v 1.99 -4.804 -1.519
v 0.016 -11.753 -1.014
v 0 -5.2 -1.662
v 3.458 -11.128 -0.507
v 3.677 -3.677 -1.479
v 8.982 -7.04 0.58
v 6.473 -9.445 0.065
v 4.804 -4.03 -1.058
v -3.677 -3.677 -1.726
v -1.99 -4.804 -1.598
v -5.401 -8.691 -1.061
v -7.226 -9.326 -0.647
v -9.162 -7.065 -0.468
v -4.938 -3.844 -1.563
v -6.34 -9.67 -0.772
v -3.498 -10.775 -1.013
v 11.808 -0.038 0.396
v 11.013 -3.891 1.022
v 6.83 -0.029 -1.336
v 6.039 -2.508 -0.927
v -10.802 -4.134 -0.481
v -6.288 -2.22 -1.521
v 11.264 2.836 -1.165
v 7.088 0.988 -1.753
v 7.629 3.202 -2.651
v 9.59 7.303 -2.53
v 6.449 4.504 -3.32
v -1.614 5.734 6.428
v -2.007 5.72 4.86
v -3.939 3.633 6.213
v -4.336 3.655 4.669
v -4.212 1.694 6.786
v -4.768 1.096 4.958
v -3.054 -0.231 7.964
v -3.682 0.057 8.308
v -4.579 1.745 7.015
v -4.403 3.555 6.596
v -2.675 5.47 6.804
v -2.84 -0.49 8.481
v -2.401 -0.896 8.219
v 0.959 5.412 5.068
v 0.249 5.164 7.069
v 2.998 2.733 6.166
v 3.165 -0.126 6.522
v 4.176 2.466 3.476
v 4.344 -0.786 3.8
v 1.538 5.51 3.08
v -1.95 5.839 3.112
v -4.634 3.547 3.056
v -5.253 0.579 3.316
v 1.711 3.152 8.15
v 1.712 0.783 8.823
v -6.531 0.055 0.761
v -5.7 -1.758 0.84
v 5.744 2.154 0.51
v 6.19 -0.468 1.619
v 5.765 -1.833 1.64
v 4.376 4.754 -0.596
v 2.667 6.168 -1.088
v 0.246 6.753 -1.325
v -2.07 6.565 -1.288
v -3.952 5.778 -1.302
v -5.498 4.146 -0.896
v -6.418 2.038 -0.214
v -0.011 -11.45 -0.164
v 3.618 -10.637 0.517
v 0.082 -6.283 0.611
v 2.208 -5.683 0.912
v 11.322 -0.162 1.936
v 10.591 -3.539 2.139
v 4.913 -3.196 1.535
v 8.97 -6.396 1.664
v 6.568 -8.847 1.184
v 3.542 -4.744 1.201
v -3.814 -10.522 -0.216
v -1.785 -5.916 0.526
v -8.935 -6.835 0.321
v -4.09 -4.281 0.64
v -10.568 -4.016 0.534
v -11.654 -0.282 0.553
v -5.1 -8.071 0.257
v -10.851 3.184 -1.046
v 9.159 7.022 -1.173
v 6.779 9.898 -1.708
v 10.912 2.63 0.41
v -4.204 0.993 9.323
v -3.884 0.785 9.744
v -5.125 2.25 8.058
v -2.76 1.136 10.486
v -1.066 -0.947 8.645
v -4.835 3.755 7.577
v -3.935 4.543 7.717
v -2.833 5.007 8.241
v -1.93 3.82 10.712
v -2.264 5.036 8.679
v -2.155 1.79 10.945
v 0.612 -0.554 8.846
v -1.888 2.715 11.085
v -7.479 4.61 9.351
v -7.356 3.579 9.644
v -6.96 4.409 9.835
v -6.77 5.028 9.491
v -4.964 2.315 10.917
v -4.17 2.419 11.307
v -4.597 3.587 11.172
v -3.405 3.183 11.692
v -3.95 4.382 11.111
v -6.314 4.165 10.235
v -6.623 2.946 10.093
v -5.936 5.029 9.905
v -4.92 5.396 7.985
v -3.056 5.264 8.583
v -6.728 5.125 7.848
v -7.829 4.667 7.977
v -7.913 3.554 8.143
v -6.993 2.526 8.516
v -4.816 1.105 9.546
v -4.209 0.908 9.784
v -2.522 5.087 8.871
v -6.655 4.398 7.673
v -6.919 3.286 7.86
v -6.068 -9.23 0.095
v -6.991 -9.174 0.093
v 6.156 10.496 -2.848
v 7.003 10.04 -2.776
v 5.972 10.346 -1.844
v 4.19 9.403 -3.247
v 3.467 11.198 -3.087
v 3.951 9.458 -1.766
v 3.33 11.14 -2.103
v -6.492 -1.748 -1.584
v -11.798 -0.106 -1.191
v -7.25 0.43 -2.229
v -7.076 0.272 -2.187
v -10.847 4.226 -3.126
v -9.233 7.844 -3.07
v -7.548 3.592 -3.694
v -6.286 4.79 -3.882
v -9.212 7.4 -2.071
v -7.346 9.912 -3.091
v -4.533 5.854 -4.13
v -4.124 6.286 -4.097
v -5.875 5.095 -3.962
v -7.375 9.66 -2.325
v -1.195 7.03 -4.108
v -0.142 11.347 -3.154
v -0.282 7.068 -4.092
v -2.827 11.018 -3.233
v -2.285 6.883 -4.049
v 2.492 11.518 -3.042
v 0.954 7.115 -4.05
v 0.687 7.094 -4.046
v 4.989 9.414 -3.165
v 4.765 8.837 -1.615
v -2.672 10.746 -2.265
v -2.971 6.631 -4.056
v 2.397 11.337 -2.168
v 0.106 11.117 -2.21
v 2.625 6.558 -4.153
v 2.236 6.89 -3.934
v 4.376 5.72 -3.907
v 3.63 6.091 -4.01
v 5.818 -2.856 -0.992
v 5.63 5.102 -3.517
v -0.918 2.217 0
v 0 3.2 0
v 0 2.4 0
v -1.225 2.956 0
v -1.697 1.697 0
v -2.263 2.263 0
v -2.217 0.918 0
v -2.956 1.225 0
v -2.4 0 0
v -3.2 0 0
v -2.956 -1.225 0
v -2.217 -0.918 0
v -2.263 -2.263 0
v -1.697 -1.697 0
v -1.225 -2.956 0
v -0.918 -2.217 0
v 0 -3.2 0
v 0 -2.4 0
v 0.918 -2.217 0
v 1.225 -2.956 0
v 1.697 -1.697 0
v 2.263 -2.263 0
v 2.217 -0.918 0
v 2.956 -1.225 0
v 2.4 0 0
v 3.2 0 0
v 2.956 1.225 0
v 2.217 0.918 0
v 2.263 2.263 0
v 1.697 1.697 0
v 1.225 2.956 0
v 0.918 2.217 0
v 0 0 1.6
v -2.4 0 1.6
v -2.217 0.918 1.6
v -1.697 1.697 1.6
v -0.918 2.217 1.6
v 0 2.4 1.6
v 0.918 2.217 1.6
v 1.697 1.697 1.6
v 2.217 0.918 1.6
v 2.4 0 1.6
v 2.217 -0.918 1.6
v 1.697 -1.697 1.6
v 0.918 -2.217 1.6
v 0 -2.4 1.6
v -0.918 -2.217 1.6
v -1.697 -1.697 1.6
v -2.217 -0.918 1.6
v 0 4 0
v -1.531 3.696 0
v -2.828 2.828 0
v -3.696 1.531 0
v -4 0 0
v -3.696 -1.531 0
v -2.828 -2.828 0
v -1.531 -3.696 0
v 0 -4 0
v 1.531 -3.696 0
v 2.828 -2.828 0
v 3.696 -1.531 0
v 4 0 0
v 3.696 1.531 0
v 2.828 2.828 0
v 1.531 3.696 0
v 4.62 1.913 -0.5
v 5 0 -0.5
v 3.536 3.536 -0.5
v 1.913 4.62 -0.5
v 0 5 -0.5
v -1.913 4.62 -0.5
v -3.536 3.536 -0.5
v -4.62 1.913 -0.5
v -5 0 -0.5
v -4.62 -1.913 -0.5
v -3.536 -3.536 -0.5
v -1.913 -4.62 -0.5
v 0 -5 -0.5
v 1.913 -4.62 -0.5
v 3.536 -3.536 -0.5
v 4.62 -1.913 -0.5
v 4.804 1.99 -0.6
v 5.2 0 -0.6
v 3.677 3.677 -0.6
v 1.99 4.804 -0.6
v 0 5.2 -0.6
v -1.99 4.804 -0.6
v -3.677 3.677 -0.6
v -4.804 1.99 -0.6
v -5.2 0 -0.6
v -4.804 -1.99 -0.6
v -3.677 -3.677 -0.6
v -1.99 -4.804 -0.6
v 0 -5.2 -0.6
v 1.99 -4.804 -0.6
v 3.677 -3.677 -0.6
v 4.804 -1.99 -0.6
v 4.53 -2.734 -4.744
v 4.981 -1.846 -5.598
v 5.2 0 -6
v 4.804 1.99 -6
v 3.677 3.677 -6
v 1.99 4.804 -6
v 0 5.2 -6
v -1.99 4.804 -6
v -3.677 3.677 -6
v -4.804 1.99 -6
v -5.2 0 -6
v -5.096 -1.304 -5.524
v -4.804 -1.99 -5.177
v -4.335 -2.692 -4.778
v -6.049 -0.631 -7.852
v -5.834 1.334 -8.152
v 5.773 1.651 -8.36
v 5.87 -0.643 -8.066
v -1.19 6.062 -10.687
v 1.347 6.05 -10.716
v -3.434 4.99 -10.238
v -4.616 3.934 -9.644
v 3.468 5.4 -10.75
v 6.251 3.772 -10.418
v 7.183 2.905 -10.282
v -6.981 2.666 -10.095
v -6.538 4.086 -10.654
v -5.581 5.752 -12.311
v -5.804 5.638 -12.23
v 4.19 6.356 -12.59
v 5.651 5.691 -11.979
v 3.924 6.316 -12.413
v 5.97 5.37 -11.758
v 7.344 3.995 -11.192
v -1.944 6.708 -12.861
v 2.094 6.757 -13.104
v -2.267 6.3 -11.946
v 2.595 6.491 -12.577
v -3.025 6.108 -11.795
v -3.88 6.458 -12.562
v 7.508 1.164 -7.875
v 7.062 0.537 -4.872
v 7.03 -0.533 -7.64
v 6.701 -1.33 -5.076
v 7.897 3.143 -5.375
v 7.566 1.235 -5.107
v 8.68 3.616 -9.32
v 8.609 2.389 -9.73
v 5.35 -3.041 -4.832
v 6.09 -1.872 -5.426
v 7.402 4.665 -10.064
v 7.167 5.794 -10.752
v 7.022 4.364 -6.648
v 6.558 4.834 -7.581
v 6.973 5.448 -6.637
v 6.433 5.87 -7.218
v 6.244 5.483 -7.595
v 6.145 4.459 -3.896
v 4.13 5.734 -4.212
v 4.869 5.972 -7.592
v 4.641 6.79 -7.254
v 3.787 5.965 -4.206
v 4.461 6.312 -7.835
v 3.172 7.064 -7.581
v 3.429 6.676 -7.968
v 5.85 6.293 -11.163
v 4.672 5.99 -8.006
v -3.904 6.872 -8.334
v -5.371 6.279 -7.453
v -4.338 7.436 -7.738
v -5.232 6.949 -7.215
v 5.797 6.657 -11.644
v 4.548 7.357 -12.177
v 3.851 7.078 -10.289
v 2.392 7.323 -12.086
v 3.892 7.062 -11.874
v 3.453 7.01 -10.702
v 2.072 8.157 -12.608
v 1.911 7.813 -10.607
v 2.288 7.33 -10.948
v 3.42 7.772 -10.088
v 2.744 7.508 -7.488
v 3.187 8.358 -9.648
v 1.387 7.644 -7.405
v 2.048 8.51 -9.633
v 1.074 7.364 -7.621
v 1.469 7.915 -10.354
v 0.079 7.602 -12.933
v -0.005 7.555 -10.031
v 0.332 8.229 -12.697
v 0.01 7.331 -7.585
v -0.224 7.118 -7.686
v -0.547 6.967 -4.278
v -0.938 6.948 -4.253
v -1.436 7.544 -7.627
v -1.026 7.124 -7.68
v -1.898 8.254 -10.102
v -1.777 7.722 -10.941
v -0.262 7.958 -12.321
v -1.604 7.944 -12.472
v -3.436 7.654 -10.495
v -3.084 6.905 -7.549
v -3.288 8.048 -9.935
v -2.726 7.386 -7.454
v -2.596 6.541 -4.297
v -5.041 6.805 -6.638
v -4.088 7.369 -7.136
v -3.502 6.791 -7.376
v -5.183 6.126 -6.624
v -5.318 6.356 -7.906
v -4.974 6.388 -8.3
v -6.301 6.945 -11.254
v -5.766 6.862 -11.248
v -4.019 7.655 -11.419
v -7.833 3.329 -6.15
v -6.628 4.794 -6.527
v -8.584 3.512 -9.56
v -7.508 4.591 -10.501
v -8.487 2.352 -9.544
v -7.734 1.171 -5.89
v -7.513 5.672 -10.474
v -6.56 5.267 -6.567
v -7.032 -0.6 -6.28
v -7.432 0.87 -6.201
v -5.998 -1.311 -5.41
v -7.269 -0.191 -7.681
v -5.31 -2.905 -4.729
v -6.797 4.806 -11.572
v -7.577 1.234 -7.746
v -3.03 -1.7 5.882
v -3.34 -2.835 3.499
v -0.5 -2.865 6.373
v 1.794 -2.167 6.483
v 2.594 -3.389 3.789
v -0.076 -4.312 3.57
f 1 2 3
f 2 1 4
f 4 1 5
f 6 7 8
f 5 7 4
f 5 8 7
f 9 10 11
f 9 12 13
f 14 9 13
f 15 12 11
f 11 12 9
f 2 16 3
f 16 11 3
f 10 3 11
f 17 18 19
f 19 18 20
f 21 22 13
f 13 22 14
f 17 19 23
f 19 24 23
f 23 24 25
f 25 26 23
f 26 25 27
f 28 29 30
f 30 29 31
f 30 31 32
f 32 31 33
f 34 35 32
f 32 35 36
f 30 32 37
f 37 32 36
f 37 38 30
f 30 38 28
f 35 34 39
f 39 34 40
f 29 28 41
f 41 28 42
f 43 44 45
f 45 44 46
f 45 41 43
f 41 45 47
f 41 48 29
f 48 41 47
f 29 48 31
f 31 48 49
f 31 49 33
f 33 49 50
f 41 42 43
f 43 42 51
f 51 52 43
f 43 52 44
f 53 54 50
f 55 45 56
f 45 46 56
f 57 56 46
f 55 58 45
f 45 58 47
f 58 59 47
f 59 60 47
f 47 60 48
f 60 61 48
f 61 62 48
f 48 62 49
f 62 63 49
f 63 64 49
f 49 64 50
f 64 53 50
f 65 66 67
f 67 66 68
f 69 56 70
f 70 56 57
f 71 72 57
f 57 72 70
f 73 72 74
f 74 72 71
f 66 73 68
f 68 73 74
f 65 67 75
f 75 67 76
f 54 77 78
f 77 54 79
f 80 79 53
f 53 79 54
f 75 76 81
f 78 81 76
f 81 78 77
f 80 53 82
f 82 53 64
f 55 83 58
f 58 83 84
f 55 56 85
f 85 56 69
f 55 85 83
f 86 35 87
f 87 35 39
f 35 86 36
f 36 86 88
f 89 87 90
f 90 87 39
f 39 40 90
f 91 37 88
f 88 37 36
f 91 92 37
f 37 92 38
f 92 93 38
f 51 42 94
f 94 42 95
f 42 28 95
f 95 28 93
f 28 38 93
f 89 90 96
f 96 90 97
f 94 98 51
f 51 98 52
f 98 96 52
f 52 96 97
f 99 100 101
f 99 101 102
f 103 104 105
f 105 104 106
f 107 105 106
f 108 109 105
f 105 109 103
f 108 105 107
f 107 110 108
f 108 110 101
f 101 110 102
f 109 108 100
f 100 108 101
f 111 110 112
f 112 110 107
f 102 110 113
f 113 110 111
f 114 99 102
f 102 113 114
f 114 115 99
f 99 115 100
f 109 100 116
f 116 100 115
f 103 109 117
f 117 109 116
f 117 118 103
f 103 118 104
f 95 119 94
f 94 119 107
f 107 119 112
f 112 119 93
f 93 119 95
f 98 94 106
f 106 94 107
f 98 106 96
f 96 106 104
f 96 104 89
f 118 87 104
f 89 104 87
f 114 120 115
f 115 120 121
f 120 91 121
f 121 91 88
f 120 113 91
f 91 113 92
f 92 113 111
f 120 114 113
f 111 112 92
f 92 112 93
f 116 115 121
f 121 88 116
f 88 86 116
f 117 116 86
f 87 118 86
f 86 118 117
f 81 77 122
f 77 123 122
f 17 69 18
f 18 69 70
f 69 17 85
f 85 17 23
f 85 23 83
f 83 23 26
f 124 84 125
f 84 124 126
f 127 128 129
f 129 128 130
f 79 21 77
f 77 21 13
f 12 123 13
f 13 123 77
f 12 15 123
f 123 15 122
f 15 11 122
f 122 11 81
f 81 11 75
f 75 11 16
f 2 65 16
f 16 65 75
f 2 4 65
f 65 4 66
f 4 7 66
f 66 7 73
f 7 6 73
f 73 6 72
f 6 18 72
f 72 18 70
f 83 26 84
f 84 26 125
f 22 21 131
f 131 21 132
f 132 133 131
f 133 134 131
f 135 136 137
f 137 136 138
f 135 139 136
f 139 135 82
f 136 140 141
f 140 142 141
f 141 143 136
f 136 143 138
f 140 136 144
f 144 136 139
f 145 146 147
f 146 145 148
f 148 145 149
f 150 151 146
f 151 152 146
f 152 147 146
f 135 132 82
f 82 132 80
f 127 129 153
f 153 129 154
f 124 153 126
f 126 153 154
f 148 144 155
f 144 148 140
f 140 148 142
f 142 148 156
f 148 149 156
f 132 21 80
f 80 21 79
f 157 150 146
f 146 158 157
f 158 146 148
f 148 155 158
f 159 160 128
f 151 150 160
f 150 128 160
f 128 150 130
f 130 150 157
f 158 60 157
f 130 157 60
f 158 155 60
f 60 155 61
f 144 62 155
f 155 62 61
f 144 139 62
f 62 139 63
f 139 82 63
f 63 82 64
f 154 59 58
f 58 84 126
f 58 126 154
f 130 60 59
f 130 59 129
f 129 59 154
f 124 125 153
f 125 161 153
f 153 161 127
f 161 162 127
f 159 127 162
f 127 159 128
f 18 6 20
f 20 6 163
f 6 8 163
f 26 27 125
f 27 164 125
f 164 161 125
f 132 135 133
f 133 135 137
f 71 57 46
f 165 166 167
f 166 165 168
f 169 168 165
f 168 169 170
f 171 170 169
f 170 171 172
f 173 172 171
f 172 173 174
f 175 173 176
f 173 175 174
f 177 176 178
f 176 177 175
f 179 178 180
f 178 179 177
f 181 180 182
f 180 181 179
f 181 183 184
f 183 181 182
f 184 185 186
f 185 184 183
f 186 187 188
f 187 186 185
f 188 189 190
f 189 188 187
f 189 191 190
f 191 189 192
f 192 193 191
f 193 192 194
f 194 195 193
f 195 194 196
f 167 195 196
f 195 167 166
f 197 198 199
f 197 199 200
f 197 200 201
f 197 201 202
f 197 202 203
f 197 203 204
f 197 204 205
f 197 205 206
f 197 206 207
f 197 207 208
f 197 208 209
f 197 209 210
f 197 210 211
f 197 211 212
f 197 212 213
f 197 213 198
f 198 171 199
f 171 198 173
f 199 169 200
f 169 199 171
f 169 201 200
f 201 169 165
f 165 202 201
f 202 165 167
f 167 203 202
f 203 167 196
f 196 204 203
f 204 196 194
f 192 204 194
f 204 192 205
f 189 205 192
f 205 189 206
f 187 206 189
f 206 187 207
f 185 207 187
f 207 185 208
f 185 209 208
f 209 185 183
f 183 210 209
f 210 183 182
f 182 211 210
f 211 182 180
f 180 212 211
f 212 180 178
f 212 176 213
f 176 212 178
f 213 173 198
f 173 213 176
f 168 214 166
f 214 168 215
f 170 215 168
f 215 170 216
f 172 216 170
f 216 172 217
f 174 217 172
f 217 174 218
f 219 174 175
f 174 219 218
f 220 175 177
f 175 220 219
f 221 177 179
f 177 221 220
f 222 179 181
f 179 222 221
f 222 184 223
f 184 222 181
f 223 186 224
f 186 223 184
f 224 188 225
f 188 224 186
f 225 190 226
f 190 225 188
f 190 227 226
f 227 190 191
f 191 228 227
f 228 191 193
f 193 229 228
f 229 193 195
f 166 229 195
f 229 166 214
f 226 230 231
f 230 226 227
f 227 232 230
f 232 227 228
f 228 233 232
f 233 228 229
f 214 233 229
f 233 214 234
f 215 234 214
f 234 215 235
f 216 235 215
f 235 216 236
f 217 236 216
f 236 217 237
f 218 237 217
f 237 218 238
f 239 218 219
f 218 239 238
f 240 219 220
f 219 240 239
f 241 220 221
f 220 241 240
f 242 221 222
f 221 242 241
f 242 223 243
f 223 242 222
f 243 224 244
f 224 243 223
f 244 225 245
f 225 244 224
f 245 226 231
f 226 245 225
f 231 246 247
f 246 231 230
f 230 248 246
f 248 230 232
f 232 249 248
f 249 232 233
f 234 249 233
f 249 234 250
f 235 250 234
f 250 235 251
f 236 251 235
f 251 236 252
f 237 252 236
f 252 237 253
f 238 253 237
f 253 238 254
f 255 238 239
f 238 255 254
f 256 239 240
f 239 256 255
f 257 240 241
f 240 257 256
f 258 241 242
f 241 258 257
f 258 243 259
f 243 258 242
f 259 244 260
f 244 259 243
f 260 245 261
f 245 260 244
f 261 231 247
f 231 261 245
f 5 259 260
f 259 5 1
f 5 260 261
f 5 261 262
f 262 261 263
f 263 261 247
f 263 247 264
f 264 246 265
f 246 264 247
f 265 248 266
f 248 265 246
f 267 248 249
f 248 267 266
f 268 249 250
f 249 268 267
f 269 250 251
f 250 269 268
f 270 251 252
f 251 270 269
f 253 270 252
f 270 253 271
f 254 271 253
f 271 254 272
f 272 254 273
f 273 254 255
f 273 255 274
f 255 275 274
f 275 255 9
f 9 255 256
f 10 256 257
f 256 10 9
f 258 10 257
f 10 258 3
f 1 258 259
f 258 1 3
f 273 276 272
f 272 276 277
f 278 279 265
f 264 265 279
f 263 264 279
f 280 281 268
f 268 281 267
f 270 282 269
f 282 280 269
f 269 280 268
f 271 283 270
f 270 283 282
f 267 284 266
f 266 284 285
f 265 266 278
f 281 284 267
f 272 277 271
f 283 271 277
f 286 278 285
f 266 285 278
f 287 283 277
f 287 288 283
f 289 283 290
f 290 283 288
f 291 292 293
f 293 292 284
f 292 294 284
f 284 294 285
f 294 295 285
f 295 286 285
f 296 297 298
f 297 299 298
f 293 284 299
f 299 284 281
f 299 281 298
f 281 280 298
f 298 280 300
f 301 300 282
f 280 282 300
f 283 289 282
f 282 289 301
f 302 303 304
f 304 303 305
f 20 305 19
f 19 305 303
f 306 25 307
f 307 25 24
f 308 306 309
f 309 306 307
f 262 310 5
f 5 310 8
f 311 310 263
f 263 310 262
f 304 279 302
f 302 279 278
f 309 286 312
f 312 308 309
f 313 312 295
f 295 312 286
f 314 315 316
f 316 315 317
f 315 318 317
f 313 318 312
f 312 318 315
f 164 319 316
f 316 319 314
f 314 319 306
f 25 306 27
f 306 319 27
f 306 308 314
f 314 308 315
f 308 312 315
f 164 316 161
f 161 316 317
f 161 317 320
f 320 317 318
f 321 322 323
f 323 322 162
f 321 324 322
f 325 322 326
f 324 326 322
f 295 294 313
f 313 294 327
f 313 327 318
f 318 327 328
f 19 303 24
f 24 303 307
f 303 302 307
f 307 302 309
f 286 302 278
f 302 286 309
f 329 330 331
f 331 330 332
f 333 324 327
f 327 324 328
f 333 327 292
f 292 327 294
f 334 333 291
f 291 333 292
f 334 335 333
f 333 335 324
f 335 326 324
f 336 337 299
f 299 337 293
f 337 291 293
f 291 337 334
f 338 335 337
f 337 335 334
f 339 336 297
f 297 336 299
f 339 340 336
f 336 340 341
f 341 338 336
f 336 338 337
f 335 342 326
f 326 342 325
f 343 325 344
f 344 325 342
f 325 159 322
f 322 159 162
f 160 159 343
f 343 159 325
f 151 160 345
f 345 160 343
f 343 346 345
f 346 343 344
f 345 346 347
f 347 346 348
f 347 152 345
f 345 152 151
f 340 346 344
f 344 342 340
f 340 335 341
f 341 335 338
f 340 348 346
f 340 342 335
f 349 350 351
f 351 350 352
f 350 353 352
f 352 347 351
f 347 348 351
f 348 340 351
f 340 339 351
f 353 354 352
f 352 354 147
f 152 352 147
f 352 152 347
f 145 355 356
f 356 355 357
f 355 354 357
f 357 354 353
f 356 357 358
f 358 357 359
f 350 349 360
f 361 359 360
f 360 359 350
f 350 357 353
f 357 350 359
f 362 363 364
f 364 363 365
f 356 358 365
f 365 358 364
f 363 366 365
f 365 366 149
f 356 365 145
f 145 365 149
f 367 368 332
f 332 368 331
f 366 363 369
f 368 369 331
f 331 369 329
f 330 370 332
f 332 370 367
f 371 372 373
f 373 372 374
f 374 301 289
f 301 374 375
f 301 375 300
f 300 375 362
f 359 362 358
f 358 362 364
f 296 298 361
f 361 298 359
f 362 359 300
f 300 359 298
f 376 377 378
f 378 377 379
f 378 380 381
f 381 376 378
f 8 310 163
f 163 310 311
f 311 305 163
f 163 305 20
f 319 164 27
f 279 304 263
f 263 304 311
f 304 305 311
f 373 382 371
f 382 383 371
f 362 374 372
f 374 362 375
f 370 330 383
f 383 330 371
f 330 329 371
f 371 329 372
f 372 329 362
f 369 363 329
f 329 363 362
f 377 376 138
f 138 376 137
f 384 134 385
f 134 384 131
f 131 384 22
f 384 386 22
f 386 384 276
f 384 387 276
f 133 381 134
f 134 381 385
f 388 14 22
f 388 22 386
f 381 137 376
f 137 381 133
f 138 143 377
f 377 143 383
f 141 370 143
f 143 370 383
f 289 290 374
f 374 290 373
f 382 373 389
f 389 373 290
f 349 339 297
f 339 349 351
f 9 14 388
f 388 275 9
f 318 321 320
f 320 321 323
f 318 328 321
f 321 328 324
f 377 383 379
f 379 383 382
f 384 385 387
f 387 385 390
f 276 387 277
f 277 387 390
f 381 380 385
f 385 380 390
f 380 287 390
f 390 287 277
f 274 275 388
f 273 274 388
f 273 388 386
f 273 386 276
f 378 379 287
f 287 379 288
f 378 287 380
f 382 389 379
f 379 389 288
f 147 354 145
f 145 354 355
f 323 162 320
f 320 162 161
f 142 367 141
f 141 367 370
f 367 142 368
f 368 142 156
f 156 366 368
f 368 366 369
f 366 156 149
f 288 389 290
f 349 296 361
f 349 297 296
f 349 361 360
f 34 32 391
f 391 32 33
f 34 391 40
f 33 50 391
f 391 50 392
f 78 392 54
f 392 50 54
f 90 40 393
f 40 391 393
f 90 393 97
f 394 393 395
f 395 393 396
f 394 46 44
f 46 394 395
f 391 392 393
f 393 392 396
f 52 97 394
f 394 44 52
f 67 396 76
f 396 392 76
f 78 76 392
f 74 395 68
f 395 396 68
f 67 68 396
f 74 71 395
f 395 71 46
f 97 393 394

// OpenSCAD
use <../lib.scad>
use <s/20606s01.scad>
use <s/20606s02.scad>
use <s/20606s03.scad>
function ldraw_lib__20606p05() = [
// 0 Minifig Hair Mid-Length Scraggly with Dual Mould Dark Green Floppy Witch Hat
// 0 Name: 20606p05.dat
// 0 Author: Lisa Winter [LisaWinter]
// 0 !LDRAW_ORG Part UPDATE 2026-07
// 0 !LICENSE Licensed under CC BY 4.0 : see CAreadme.txt
// 
// 0 BFC CERTIFY CCW
  [0,"BFC","CERTIFY"],
  [0,"BFC","CCW"],
// 
// 0 !CATEGORY Minifig Headwear
// 0 !KEYWORDS BAM, Bricklink 20606pb05, Brickowl 20606, Build-A-Minifigure
// 0 !KEYWORDS Colour Combination, Halloween, Rebrickable 20606pr0005
// 
// 0 !HISTORY 2026-07-30 [OrionP] Official Update 2026-07
// 
// 0 // Hat
// 1 288 0 0 0 1 0 0 0 1 0 0 0 1 s\20606s01.dat
  [1,288,0,0,0,1,0,0,0,1,0,0,0,1, ldraw_lib__s__20606s01()],
// 0 // Hair
// 1 16 0 0 0 1 0 0 0 1 0 0 0 1 s\20606s02.dat
  [1,16,0,0,0,1,0,0,0,1,0,0,0,1, ldraw_lib__s__20606s02()],
// 0 // Patternable area
// 1 288 0 0 0 1 0 0 0 1 0 0 0 1 s\20606s03.dat
  [1,288,0,0,0,1,0,0,0,1,0,0,0,1, ldraw_lib__s__20606s03()],
];
module ldraw_lib__20606p05(step=0, col=false, unit=2/5, alt=false, line=0.2, solid=!$preview)
    makepoly(ldraw_lib__20606p05(), step=step, col=col, unit=unit, alt=alt, line=line, solid=solid);
ldraw_lib__20606p05(line=0.2);
